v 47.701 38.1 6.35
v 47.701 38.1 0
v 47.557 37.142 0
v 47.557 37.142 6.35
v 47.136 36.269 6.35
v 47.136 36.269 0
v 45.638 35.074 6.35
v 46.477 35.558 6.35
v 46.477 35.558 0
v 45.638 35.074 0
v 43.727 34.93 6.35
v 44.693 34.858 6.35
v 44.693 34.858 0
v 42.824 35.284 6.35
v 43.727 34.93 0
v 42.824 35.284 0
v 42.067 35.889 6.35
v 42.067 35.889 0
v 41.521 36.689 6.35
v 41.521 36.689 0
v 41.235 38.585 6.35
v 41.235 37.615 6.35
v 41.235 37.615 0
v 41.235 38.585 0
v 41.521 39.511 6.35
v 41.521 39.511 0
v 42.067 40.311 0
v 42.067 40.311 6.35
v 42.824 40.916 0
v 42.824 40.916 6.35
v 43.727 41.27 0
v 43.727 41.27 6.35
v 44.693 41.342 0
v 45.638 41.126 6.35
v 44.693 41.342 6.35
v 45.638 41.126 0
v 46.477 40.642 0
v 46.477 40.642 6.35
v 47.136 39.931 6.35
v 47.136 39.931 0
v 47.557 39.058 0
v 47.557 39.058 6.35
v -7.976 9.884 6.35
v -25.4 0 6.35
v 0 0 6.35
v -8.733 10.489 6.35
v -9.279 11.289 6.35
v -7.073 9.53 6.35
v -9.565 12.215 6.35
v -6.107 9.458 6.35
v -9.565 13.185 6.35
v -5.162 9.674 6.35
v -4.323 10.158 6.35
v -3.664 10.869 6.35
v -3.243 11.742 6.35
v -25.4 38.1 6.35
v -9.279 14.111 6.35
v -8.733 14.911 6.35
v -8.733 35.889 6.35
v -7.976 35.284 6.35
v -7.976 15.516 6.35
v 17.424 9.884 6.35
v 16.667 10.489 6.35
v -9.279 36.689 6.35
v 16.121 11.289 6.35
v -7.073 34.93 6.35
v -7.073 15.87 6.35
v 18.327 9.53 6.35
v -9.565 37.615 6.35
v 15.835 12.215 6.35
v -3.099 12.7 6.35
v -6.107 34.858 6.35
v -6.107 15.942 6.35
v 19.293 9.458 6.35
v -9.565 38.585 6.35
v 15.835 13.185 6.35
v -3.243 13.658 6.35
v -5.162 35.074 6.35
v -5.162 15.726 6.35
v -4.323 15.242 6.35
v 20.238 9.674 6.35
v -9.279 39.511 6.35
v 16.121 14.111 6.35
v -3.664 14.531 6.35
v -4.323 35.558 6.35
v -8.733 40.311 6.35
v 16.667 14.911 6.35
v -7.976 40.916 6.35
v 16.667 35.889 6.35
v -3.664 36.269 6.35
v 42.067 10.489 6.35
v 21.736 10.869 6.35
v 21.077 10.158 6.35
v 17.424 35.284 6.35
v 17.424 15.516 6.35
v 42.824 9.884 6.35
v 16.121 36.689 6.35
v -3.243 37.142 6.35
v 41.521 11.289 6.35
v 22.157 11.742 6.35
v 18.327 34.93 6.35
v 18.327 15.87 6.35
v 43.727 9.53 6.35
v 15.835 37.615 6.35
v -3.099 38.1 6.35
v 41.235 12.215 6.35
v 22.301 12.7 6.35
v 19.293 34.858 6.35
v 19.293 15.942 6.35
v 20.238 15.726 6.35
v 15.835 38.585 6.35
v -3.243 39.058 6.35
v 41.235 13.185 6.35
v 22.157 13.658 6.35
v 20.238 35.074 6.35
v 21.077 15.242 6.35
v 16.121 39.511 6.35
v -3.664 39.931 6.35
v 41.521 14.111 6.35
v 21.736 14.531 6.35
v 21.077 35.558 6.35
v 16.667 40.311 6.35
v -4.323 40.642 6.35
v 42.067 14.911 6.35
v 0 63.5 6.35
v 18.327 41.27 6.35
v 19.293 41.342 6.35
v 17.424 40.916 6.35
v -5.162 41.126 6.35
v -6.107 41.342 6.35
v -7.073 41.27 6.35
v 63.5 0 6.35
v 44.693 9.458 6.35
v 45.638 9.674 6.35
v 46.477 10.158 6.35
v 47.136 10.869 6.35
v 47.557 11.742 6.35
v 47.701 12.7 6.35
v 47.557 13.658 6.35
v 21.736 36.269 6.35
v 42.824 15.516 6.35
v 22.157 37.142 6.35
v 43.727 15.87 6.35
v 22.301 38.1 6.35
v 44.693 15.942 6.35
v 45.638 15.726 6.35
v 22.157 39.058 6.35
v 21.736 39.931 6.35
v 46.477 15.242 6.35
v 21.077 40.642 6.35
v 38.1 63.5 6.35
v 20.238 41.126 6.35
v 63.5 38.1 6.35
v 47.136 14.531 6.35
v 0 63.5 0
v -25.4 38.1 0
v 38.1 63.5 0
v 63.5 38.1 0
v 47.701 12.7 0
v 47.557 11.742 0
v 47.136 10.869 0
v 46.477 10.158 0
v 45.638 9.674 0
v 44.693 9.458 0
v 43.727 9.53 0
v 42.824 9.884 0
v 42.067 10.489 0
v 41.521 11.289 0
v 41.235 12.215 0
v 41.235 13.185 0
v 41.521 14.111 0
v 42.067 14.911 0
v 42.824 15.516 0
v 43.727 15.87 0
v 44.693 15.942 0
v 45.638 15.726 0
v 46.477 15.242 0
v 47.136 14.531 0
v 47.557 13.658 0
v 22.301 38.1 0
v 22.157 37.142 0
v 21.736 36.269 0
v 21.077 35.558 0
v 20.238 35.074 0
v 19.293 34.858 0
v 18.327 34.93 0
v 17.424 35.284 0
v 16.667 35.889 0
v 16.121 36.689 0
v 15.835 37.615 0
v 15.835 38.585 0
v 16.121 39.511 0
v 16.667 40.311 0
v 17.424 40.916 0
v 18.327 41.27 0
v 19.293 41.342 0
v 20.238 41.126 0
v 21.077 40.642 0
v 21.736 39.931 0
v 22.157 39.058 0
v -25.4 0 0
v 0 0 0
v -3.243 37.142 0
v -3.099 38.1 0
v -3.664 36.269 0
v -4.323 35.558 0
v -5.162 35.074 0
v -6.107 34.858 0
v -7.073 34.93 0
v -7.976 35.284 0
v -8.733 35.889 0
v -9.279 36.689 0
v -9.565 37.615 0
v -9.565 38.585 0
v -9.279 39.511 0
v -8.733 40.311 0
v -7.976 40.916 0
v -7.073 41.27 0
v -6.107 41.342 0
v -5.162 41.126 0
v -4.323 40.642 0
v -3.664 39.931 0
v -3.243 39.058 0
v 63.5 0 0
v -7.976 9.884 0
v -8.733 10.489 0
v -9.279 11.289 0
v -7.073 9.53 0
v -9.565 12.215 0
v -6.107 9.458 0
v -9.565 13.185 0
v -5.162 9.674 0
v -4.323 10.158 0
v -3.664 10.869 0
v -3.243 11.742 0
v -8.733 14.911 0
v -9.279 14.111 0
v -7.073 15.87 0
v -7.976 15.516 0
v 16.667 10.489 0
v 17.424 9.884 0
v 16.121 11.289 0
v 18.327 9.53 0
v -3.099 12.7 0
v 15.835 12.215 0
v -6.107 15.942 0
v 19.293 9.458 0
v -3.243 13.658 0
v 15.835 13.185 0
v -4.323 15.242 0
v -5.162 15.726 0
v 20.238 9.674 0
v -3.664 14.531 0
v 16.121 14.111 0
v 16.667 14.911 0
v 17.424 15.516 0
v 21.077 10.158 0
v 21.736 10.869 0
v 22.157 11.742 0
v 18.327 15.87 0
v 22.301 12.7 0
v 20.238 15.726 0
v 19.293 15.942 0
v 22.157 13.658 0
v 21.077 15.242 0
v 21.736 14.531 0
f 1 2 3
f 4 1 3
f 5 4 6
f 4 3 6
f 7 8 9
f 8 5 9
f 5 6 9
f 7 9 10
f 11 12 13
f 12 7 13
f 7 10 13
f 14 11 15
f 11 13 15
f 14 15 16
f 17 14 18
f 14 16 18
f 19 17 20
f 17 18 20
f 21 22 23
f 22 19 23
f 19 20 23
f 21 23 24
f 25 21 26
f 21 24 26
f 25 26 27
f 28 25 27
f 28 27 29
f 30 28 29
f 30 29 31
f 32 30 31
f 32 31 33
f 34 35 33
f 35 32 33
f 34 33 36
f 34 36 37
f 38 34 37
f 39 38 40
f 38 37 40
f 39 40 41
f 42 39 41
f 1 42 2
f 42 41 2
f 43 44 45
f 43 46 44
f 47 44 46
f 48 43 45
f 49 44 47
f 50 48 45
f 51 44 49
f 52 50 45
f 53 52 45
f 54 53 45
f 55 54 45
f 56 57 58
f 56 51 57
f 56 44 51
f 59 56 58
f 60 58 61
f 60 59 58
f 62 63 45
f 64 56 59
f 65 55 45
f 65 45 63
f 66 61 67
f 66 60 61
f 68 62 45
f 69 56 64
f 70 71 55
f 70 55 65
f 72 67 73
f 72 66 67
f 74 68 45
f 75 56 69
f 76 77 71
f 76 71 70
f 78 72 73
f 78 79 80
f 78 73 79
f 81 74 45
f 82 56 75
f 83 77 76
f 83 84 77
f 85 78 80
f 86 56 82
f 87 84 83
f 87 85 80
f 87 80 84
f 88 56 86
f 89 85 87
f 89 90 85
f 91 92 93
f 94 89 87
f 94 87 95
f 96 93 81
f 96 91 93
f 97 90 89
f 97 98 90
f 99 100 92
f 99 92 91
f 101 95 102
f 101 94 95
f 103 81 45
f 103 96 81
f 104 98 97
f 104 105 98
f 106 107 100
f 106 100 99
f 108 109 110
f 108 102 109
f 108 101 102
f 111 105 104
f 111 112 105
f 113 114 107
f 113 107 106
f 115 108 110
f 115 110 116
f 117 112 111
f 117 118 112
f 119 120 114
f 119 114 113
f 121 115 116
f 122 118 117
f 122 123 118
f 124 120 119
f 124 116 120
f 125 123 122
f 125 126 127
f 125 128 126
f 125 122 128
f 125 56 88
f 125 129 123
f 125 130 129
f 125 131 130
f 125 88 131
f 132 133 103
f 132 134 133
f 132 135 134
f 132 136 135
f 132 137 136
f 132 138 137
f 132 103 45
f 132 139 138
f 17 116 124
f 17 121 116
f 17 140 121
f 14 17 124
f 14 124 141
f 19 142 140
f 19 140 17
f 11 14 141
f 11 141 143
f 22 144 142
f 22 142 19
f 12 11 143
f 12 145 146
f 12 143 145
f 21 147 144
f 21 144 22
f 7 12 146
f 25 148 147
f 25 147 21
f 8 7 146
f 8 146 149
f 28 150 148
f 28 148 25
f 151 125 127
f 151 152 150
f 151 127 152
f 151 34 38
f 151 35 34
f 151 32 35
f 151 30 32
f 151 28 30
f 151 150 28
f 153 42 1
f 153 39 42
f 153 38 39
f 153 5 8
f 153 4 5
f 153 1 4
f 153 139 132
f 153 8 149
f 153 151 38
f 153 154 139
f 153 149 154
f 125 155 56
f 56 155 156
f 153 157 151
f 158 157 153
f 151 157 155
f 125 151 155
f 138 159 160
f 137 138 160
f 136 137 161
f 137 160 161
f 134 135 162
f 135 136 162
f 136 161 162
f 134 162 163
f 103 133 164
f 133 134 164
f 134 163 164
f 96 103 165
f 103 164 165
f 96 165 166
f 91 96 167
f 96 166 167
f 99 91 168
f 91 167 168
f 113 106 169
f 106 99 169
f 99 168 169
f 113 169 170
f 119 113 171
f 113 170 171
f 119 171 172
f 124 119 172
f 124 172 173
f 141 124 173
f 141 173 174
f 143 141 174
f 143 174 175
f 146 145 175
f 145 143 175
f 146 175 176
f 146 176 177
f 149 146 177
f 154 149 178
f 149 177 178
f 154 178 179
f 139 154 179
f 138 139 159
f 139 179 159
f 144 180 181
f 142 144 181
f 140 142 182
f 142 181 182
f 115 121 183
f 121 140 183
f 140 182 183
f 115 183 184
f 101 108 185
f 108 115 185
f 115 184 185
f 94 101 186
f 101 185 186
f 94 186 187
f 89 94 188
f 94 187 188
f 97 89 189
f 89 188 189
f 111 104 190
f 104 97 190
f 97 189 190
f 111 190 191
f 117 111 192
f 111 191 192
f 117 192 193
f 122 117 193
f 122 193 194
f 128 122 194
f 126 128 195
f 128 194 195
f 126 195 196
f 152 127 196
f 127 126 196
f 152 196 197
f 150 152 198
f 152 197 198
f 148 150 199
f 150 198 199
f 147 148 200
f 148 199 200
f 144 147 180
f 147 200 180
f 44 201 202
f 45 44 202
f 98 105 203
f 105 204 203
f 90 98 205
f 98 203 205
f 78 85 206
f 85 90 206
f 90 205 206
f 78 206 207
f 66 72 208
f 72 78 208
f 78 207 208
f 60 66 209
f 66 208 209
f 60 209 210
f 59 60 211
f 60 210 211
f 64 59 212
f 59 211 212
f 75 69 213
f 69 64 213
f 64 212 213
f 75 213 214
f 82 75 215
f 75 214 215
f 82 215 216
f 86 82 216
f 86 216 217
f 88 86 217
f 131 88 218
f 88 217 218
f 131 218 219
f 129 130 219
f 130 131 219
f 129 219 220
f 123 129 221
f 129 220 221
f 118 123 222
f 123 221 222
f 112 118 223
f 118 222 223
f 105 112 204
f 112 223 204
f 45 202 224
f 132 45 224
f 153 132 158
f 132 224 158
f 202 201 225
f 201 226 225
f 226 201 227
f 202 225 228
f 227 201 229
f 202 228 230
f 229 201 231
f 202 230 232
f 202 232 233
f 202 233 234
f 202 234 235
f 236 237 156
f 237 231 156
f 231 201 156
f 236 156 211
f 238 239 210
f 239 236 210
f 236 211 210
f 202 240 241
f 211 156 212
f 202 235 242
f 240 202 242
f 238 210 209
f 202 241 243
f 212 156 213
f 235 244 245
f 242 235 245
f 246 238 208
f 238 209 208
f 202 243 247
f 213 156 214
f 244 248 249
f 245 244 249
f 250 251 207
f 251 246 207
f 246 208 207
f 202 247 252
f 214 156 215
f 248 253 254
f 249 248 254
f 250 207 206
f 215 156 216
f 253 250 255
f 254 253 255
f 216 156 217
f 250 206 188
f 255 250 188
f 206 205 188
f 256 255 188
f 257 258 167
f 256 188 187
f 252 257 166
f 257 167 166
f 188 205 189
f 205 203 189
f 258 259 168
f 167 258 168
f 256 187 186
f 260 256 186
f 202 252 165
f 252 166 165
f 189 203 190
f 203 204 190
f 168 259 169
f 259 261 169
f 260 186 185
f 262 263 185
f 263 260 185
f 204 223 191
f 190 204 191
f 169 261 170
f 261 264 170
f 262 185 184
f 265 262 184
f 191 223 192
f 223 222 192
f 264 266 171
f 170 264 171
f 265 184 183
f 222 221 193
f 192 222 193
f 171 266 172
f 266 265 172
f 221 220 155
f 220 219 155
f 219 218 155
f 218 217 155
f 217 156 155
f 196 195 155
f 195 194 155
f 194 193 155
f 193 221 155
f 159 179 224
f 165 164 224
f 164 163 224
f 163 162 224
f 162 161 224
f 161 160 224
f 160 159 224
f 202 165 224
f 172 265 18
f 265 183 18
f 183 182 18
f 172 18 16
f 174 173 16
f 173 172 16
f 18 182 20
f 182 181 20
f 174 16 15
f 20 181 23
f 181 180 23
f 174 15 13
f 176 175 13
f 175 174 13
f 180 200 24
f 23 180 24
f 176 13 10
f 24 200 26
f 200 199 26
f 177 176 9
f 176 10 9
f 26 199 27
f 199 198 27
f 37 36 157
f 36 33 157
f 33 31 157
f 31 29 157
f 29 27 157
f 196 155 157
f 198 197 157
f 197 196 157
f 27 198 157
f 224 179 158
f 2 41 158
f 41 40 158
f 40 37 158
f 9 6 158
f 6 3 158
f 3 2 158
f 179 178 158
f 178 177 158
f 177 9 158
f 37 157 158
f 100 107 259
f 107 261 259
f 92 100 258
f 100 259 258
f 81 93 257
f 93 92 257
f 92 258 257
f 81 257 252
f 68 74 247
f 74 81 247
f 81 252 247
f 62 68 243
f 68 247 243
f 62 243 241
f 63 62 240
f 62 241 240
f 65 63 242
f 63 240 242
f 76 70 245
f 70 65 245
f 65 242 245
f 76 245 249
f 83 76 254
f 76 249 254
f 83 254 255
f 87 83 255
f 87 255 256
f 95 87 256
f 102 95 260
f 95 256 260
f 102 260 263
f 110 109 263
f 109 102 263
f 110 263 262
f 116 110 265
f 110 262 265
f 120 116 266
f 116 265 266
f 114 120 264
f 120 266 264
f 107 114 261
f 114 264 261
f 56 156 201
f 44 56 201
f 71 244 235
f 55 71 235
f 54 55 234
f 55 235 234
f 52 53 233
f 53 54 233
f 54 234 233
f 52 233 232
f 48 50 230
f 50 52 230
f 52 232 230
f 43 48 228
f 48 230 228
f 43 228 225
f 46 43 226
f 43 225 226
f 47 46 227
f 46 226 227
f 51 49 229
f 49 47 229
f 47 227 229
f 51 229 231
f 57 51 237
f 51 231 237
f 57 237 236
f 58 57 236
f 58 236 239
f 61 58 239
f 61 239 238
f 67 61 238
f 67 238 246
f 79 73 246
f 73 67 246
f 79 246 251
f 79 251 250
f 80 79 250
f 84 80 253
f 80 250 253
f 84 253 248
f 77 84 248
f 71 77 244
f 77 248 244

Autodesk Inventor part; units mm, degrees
ref_plane "YZ Plane" through (0, 0, 0) normal (1, 0, 0) x (0, 1, 0)
ref_plane "XZ Plane" through (0, 0, 0) normal (0, 1, 0) x (-1, 0, 0)
ref_plane "XY Plane" through (0, 0, 0) normal (0, 0, 1) x (1, 0, 0)
sketch "Sketch1" plane through (0, 0, 0) normal (0, 0, 1) x (1, 0, 0)
  line L0 (0, 0) -> (63.5, 0)
  line L1 (63.5, 0) -> (63.5, 38.1)
  line L2 (38.1, 63.5) -> (0, 63.5)
  line L3 (-25.4, 38.1) -> (-25.4, 0)
  line L4 (-25.4, 0) -> (0, 0)
  line L5 (38.1, 63.5) -> (63.5, 38.1)
  line L6 (0, 63.5) -> (-25.4, 38.1)
  circle A0 centre (-6.35, 12.7) radius 3.2512
  circle A1 centre (-6.35, 38.1) radius 3.2512
  circle A2 centre (19.05, 38.1) radius 3.2512
  circle A3 centre (19.05, 12.7) radius 3.2512
  circle A4 centre (44.45, 38.1) radius 3.2512
  circle A5 centre (44.45, 12.7) radius 3.2512
  dimension "d5" = 63.5
  dimension "d6" = 25.4
  dimension "d7" = 38.1
  dimension "d8" = 25.4
  dimension "d9" = 25.4
  dimension "d10" = 38.1
  dimension "d11" = 25.4
  dimension "d12" = 25.4
  dimension "d13" = 38.1
  dimension "d14" = 135
  dimension "d15" = 135
  dimension "d16" = 90
  dimension "d17" = 6.5024
  dimension "d18" = 12.7
  dimension "d19" = 19.05
  dimension "d22" = 25.4
  dimension "d29" = 25.4
extrude "Extrusion1" add sketch "Sketch1" along normal blind 6.35
properties part number "3.5x2.5"
